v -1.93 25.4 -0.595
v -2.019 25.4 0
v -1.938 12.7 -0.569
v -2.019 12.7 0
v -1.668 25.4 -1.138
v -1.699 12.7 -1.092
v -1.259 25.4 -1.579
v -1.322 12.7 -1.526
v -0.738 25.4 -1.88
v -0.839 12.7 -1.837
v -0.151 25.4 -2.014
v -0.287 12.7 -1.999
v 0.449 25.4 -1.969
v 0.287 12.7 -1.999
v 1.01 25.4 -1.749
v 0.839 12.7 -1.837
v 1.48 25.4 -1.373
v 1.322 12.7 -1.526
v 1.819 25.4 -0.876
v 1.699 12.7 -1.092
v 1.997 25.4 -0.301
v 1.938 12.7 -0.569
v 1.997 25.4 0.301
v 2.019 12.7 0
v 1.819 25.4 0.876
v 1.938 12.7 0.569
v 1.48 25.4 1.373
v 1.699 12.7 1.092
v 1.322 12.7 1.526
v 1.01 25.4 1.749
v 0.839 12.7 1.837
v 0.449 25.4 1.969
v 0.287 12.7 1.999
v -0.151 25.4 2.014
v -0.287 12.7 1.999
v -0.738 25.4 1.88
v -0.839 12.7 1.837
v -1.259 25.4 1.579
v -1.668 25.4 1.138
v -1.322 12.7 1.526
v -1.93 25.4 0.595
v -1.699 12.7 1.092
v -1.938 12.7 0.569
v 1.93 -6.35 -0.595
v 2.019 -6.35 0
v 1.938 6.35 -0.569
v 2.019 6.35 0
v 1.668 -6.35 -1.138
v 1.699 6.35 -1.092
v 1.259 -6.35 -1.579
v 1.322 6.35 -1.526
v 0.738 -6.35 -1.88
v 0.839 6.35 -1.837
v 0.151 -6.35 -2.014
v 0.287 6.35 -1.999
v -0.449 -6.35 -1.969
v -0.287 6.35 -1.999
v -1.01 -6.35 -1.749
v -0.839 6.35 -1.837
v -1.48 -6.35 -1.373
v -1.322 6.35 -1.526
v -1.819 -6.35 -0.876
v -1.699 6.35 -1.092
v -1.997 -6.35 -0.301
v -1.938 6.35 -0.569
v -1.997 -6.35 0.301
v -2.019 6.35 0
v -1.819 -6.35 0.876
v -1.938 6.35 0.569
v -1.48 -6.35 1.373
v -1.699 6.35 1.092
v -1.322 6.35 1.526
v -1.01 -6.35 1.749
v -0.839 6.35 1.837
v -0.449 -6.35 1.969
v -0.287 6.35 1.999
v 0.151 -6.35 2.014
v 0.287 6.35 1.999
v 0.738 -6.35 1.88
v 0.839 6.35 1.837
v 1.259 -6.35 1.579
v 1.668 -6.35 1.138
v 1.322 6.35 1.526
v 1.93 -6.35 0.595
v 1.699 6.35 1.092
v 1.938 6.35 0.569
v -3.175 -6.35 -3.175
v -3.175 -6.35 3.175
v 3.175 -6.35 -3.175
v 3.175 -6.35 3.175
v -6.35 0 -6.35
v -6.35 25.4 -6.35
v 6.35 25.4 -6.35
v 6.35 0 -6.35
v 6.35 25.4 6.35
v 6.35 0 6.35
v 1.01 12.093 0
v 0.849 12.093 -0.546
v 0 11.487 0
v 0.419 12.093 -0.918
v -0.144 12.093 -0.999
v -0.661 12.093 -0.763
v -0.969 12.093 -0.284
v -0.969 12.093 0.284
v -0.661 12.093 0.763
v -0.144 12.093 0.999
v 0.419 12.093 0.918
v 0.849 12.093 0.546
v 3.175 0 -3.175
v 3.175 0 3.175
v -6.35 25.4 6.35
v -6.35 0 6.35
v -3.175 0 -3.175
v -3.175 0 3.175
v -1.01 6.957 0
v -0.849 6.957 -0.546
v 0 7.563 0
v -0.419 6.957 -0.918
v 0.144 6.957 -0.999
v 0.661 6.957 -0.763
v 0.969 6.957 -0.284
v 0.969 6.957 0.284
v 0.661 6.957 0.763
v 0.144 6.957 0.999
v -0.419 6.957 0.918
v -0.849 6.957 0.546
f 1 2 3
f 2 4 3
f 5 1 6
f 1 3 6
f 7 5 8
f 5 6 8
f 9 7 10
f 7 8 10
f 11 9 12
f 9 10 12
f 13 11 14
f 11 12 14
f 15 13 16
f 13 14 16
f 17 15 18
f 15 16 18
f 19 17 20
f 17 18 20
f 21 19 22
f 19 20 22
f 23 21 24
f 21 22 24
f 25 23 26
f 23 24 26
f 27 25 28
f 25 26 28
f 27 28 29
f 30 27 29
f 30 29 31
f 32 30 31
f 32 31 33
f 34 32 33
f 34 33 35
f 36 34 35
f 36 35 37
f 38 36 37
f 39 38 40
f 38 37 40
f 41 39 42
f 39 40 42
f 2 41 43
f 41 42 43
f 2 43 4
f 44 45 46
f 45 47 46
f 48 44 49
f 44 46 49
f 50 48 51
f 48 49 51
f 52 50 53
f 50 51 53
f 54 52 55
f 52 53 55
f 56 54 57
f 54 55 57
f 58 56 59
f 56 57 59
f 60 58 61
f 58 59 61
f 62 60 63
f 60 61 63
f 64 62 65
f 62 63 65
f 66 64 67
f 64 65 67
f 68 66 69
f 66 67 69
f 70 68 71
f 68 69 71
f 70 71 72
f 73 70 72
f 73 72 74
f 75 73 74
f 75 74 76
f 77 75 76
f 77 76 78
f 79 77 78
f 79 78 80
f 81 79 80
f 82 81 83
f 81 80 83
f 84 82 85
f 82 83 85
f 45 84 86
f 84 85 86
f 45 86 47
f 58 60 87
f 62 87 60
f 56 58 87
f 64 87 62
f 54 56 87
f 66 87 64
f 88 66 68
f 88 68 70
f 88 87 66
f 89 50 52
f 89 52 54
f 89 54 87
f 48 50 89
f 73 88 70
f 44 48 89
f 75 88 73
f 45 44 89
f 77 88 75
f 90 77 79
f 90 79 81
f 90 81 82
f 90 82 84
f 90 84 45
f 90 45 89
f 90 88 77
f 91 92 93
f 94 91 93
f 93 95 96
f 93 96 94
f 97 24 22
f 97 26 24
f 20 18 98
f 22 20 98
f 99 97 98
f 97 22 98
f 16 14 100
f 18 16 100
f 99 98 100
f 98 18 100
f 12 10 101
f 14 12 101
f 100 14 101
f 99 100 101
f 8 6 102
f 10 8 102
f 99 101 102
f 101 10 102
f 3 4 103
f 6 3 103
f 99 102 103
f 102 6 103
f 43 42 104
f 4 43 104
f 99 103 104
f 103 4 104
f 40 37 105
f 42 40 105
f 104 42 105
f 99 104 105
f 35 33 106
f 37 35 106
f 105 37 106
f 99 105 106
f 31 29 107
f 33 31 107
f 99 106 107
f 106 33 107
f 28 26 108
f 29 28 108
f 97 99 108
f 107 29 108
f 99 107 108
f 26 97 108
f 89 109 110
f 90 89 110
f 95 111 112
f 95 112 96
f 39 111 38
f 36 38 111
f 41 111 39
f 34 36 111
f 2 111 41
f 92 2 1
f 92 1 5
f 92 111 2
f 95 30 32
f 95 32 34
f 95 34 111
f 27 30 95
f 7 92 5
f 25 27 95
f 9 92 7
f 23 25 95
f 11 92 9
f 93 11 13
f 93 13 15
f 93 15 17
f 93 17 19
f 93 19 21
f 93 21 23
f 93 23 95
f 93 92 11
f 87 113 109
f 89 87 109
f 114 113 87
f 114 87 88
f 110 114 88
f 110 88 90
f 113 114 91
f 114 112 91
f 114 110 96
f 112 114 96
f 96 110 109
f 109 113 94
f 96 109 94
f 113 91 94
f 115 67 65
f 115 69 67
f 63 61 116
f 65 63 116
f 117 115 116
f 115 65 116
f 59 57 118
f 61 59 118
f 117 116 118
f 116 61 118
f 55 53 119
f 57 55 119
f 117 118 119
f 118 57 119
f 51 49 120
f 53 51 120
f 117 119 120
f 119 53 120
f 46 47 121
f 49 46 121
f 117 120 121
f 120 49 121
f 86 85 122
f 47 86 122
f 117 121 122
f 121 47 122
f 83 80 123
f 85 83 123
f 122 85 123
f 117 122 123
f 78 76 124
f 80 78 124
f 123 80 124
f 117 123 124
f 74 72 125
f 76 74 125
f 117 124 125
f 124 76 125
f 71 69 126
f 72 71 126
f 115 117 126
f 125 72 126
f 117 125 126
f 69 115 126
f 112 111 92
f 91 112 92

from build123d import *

# Parameters (mm, degrees)
SKETCH1_W                  = 12.7
SKETCH1_H                  = 12.7
BOSS_EXTRUDE1_DEPTH        = 25.4
SKETCH2_W                  = 6.35
SKETCH2_H                  = 6.35
BOSS_EXTRUDE2_DEPTH        = 6.35
F_10_32_TAPPED_HOLE2_D     = 4.0386
F_10_32_TAPPED_HOLE2_DEPTH = 12.7
F_10_32_TAPPED_HOLE2_TIP   = 1.213317848
F_10_32_TAPPED_HOLE3_D     = 4.0386
F_10_32_TAPPED_HOLE3_DEPTH = 12.7
F_10_32_TAPPED_HOLE3_TIP   = 1.213317848


with BuildPart() as part:
    # Sketch1 → Boss-Extrude1 (new body)
    with BuildSketch(Plane(origin=(0, 0, 0), x_dir=(1, 0, 0), z_dir=(0, 1, 0))):
        Rectangle(SKETCH1_W, SKETCH1_H)
    extrude(amount=BOSS_EXTRUDE1_DEPTH)

    # Sketch2 → Boss-Extrude2 (add)
    with BuildSketch(Plane.XZ):
        Rectangle(SKETCH2_W, SKETCH2_H)
    extrude(amount=BOSS_EXTRUDE2_DEPTH)

    # #10-32 Tapped Hole2
    with Locations(Plane(origin=(0, -6.35, 0), x_dir=(-1, 0, 0), z_dir=(0, -1, 0))):
        with Locations((0, 0)):
            Hole(F_10_32_TAPPED_HOLE2_D / 2, depth=F_10_32_TAPPED_HOLE2_DEPTH)
            with Locations((0, 0, -(F_10_32_TAPPED_HOLE2_DEPTH + F_10_32_TAPPED_HOLE2_TIP / 2))):  # 118° drill point
                Cone(0, F_10_32_TAPPED_HOLE2_D / 2, F_10_32_TAPPED_HOLE2_TIP, mode=Mode.SUBTRACT)

    # #10-32 Tapped Hole3
    with Locations(Plane(origin=(0, 25.4, 0), x_dir=(1, 0, 0), z_dir=(0, 1, 0))):
        with Locations((0, 0)):
            Hole(F_10_32_TAPPED_HOLE3_D / 2, depth=F_10_32_TAPPED_HOLE3_DEPTH)
            with Locations((0, 0, -(F_10_32_TAPPED_HOLE3_DEPTH + F_10_32_TAPPED_HOLE3_TIP / 2))):  # 118° drill point
                Cone(0, F_10_32_TAPPED_HOLE3_D / 2, F_10_32_TAPPED_HOLE3_TIP, mode=Mode.SUBTRACT)


solid = part.part
